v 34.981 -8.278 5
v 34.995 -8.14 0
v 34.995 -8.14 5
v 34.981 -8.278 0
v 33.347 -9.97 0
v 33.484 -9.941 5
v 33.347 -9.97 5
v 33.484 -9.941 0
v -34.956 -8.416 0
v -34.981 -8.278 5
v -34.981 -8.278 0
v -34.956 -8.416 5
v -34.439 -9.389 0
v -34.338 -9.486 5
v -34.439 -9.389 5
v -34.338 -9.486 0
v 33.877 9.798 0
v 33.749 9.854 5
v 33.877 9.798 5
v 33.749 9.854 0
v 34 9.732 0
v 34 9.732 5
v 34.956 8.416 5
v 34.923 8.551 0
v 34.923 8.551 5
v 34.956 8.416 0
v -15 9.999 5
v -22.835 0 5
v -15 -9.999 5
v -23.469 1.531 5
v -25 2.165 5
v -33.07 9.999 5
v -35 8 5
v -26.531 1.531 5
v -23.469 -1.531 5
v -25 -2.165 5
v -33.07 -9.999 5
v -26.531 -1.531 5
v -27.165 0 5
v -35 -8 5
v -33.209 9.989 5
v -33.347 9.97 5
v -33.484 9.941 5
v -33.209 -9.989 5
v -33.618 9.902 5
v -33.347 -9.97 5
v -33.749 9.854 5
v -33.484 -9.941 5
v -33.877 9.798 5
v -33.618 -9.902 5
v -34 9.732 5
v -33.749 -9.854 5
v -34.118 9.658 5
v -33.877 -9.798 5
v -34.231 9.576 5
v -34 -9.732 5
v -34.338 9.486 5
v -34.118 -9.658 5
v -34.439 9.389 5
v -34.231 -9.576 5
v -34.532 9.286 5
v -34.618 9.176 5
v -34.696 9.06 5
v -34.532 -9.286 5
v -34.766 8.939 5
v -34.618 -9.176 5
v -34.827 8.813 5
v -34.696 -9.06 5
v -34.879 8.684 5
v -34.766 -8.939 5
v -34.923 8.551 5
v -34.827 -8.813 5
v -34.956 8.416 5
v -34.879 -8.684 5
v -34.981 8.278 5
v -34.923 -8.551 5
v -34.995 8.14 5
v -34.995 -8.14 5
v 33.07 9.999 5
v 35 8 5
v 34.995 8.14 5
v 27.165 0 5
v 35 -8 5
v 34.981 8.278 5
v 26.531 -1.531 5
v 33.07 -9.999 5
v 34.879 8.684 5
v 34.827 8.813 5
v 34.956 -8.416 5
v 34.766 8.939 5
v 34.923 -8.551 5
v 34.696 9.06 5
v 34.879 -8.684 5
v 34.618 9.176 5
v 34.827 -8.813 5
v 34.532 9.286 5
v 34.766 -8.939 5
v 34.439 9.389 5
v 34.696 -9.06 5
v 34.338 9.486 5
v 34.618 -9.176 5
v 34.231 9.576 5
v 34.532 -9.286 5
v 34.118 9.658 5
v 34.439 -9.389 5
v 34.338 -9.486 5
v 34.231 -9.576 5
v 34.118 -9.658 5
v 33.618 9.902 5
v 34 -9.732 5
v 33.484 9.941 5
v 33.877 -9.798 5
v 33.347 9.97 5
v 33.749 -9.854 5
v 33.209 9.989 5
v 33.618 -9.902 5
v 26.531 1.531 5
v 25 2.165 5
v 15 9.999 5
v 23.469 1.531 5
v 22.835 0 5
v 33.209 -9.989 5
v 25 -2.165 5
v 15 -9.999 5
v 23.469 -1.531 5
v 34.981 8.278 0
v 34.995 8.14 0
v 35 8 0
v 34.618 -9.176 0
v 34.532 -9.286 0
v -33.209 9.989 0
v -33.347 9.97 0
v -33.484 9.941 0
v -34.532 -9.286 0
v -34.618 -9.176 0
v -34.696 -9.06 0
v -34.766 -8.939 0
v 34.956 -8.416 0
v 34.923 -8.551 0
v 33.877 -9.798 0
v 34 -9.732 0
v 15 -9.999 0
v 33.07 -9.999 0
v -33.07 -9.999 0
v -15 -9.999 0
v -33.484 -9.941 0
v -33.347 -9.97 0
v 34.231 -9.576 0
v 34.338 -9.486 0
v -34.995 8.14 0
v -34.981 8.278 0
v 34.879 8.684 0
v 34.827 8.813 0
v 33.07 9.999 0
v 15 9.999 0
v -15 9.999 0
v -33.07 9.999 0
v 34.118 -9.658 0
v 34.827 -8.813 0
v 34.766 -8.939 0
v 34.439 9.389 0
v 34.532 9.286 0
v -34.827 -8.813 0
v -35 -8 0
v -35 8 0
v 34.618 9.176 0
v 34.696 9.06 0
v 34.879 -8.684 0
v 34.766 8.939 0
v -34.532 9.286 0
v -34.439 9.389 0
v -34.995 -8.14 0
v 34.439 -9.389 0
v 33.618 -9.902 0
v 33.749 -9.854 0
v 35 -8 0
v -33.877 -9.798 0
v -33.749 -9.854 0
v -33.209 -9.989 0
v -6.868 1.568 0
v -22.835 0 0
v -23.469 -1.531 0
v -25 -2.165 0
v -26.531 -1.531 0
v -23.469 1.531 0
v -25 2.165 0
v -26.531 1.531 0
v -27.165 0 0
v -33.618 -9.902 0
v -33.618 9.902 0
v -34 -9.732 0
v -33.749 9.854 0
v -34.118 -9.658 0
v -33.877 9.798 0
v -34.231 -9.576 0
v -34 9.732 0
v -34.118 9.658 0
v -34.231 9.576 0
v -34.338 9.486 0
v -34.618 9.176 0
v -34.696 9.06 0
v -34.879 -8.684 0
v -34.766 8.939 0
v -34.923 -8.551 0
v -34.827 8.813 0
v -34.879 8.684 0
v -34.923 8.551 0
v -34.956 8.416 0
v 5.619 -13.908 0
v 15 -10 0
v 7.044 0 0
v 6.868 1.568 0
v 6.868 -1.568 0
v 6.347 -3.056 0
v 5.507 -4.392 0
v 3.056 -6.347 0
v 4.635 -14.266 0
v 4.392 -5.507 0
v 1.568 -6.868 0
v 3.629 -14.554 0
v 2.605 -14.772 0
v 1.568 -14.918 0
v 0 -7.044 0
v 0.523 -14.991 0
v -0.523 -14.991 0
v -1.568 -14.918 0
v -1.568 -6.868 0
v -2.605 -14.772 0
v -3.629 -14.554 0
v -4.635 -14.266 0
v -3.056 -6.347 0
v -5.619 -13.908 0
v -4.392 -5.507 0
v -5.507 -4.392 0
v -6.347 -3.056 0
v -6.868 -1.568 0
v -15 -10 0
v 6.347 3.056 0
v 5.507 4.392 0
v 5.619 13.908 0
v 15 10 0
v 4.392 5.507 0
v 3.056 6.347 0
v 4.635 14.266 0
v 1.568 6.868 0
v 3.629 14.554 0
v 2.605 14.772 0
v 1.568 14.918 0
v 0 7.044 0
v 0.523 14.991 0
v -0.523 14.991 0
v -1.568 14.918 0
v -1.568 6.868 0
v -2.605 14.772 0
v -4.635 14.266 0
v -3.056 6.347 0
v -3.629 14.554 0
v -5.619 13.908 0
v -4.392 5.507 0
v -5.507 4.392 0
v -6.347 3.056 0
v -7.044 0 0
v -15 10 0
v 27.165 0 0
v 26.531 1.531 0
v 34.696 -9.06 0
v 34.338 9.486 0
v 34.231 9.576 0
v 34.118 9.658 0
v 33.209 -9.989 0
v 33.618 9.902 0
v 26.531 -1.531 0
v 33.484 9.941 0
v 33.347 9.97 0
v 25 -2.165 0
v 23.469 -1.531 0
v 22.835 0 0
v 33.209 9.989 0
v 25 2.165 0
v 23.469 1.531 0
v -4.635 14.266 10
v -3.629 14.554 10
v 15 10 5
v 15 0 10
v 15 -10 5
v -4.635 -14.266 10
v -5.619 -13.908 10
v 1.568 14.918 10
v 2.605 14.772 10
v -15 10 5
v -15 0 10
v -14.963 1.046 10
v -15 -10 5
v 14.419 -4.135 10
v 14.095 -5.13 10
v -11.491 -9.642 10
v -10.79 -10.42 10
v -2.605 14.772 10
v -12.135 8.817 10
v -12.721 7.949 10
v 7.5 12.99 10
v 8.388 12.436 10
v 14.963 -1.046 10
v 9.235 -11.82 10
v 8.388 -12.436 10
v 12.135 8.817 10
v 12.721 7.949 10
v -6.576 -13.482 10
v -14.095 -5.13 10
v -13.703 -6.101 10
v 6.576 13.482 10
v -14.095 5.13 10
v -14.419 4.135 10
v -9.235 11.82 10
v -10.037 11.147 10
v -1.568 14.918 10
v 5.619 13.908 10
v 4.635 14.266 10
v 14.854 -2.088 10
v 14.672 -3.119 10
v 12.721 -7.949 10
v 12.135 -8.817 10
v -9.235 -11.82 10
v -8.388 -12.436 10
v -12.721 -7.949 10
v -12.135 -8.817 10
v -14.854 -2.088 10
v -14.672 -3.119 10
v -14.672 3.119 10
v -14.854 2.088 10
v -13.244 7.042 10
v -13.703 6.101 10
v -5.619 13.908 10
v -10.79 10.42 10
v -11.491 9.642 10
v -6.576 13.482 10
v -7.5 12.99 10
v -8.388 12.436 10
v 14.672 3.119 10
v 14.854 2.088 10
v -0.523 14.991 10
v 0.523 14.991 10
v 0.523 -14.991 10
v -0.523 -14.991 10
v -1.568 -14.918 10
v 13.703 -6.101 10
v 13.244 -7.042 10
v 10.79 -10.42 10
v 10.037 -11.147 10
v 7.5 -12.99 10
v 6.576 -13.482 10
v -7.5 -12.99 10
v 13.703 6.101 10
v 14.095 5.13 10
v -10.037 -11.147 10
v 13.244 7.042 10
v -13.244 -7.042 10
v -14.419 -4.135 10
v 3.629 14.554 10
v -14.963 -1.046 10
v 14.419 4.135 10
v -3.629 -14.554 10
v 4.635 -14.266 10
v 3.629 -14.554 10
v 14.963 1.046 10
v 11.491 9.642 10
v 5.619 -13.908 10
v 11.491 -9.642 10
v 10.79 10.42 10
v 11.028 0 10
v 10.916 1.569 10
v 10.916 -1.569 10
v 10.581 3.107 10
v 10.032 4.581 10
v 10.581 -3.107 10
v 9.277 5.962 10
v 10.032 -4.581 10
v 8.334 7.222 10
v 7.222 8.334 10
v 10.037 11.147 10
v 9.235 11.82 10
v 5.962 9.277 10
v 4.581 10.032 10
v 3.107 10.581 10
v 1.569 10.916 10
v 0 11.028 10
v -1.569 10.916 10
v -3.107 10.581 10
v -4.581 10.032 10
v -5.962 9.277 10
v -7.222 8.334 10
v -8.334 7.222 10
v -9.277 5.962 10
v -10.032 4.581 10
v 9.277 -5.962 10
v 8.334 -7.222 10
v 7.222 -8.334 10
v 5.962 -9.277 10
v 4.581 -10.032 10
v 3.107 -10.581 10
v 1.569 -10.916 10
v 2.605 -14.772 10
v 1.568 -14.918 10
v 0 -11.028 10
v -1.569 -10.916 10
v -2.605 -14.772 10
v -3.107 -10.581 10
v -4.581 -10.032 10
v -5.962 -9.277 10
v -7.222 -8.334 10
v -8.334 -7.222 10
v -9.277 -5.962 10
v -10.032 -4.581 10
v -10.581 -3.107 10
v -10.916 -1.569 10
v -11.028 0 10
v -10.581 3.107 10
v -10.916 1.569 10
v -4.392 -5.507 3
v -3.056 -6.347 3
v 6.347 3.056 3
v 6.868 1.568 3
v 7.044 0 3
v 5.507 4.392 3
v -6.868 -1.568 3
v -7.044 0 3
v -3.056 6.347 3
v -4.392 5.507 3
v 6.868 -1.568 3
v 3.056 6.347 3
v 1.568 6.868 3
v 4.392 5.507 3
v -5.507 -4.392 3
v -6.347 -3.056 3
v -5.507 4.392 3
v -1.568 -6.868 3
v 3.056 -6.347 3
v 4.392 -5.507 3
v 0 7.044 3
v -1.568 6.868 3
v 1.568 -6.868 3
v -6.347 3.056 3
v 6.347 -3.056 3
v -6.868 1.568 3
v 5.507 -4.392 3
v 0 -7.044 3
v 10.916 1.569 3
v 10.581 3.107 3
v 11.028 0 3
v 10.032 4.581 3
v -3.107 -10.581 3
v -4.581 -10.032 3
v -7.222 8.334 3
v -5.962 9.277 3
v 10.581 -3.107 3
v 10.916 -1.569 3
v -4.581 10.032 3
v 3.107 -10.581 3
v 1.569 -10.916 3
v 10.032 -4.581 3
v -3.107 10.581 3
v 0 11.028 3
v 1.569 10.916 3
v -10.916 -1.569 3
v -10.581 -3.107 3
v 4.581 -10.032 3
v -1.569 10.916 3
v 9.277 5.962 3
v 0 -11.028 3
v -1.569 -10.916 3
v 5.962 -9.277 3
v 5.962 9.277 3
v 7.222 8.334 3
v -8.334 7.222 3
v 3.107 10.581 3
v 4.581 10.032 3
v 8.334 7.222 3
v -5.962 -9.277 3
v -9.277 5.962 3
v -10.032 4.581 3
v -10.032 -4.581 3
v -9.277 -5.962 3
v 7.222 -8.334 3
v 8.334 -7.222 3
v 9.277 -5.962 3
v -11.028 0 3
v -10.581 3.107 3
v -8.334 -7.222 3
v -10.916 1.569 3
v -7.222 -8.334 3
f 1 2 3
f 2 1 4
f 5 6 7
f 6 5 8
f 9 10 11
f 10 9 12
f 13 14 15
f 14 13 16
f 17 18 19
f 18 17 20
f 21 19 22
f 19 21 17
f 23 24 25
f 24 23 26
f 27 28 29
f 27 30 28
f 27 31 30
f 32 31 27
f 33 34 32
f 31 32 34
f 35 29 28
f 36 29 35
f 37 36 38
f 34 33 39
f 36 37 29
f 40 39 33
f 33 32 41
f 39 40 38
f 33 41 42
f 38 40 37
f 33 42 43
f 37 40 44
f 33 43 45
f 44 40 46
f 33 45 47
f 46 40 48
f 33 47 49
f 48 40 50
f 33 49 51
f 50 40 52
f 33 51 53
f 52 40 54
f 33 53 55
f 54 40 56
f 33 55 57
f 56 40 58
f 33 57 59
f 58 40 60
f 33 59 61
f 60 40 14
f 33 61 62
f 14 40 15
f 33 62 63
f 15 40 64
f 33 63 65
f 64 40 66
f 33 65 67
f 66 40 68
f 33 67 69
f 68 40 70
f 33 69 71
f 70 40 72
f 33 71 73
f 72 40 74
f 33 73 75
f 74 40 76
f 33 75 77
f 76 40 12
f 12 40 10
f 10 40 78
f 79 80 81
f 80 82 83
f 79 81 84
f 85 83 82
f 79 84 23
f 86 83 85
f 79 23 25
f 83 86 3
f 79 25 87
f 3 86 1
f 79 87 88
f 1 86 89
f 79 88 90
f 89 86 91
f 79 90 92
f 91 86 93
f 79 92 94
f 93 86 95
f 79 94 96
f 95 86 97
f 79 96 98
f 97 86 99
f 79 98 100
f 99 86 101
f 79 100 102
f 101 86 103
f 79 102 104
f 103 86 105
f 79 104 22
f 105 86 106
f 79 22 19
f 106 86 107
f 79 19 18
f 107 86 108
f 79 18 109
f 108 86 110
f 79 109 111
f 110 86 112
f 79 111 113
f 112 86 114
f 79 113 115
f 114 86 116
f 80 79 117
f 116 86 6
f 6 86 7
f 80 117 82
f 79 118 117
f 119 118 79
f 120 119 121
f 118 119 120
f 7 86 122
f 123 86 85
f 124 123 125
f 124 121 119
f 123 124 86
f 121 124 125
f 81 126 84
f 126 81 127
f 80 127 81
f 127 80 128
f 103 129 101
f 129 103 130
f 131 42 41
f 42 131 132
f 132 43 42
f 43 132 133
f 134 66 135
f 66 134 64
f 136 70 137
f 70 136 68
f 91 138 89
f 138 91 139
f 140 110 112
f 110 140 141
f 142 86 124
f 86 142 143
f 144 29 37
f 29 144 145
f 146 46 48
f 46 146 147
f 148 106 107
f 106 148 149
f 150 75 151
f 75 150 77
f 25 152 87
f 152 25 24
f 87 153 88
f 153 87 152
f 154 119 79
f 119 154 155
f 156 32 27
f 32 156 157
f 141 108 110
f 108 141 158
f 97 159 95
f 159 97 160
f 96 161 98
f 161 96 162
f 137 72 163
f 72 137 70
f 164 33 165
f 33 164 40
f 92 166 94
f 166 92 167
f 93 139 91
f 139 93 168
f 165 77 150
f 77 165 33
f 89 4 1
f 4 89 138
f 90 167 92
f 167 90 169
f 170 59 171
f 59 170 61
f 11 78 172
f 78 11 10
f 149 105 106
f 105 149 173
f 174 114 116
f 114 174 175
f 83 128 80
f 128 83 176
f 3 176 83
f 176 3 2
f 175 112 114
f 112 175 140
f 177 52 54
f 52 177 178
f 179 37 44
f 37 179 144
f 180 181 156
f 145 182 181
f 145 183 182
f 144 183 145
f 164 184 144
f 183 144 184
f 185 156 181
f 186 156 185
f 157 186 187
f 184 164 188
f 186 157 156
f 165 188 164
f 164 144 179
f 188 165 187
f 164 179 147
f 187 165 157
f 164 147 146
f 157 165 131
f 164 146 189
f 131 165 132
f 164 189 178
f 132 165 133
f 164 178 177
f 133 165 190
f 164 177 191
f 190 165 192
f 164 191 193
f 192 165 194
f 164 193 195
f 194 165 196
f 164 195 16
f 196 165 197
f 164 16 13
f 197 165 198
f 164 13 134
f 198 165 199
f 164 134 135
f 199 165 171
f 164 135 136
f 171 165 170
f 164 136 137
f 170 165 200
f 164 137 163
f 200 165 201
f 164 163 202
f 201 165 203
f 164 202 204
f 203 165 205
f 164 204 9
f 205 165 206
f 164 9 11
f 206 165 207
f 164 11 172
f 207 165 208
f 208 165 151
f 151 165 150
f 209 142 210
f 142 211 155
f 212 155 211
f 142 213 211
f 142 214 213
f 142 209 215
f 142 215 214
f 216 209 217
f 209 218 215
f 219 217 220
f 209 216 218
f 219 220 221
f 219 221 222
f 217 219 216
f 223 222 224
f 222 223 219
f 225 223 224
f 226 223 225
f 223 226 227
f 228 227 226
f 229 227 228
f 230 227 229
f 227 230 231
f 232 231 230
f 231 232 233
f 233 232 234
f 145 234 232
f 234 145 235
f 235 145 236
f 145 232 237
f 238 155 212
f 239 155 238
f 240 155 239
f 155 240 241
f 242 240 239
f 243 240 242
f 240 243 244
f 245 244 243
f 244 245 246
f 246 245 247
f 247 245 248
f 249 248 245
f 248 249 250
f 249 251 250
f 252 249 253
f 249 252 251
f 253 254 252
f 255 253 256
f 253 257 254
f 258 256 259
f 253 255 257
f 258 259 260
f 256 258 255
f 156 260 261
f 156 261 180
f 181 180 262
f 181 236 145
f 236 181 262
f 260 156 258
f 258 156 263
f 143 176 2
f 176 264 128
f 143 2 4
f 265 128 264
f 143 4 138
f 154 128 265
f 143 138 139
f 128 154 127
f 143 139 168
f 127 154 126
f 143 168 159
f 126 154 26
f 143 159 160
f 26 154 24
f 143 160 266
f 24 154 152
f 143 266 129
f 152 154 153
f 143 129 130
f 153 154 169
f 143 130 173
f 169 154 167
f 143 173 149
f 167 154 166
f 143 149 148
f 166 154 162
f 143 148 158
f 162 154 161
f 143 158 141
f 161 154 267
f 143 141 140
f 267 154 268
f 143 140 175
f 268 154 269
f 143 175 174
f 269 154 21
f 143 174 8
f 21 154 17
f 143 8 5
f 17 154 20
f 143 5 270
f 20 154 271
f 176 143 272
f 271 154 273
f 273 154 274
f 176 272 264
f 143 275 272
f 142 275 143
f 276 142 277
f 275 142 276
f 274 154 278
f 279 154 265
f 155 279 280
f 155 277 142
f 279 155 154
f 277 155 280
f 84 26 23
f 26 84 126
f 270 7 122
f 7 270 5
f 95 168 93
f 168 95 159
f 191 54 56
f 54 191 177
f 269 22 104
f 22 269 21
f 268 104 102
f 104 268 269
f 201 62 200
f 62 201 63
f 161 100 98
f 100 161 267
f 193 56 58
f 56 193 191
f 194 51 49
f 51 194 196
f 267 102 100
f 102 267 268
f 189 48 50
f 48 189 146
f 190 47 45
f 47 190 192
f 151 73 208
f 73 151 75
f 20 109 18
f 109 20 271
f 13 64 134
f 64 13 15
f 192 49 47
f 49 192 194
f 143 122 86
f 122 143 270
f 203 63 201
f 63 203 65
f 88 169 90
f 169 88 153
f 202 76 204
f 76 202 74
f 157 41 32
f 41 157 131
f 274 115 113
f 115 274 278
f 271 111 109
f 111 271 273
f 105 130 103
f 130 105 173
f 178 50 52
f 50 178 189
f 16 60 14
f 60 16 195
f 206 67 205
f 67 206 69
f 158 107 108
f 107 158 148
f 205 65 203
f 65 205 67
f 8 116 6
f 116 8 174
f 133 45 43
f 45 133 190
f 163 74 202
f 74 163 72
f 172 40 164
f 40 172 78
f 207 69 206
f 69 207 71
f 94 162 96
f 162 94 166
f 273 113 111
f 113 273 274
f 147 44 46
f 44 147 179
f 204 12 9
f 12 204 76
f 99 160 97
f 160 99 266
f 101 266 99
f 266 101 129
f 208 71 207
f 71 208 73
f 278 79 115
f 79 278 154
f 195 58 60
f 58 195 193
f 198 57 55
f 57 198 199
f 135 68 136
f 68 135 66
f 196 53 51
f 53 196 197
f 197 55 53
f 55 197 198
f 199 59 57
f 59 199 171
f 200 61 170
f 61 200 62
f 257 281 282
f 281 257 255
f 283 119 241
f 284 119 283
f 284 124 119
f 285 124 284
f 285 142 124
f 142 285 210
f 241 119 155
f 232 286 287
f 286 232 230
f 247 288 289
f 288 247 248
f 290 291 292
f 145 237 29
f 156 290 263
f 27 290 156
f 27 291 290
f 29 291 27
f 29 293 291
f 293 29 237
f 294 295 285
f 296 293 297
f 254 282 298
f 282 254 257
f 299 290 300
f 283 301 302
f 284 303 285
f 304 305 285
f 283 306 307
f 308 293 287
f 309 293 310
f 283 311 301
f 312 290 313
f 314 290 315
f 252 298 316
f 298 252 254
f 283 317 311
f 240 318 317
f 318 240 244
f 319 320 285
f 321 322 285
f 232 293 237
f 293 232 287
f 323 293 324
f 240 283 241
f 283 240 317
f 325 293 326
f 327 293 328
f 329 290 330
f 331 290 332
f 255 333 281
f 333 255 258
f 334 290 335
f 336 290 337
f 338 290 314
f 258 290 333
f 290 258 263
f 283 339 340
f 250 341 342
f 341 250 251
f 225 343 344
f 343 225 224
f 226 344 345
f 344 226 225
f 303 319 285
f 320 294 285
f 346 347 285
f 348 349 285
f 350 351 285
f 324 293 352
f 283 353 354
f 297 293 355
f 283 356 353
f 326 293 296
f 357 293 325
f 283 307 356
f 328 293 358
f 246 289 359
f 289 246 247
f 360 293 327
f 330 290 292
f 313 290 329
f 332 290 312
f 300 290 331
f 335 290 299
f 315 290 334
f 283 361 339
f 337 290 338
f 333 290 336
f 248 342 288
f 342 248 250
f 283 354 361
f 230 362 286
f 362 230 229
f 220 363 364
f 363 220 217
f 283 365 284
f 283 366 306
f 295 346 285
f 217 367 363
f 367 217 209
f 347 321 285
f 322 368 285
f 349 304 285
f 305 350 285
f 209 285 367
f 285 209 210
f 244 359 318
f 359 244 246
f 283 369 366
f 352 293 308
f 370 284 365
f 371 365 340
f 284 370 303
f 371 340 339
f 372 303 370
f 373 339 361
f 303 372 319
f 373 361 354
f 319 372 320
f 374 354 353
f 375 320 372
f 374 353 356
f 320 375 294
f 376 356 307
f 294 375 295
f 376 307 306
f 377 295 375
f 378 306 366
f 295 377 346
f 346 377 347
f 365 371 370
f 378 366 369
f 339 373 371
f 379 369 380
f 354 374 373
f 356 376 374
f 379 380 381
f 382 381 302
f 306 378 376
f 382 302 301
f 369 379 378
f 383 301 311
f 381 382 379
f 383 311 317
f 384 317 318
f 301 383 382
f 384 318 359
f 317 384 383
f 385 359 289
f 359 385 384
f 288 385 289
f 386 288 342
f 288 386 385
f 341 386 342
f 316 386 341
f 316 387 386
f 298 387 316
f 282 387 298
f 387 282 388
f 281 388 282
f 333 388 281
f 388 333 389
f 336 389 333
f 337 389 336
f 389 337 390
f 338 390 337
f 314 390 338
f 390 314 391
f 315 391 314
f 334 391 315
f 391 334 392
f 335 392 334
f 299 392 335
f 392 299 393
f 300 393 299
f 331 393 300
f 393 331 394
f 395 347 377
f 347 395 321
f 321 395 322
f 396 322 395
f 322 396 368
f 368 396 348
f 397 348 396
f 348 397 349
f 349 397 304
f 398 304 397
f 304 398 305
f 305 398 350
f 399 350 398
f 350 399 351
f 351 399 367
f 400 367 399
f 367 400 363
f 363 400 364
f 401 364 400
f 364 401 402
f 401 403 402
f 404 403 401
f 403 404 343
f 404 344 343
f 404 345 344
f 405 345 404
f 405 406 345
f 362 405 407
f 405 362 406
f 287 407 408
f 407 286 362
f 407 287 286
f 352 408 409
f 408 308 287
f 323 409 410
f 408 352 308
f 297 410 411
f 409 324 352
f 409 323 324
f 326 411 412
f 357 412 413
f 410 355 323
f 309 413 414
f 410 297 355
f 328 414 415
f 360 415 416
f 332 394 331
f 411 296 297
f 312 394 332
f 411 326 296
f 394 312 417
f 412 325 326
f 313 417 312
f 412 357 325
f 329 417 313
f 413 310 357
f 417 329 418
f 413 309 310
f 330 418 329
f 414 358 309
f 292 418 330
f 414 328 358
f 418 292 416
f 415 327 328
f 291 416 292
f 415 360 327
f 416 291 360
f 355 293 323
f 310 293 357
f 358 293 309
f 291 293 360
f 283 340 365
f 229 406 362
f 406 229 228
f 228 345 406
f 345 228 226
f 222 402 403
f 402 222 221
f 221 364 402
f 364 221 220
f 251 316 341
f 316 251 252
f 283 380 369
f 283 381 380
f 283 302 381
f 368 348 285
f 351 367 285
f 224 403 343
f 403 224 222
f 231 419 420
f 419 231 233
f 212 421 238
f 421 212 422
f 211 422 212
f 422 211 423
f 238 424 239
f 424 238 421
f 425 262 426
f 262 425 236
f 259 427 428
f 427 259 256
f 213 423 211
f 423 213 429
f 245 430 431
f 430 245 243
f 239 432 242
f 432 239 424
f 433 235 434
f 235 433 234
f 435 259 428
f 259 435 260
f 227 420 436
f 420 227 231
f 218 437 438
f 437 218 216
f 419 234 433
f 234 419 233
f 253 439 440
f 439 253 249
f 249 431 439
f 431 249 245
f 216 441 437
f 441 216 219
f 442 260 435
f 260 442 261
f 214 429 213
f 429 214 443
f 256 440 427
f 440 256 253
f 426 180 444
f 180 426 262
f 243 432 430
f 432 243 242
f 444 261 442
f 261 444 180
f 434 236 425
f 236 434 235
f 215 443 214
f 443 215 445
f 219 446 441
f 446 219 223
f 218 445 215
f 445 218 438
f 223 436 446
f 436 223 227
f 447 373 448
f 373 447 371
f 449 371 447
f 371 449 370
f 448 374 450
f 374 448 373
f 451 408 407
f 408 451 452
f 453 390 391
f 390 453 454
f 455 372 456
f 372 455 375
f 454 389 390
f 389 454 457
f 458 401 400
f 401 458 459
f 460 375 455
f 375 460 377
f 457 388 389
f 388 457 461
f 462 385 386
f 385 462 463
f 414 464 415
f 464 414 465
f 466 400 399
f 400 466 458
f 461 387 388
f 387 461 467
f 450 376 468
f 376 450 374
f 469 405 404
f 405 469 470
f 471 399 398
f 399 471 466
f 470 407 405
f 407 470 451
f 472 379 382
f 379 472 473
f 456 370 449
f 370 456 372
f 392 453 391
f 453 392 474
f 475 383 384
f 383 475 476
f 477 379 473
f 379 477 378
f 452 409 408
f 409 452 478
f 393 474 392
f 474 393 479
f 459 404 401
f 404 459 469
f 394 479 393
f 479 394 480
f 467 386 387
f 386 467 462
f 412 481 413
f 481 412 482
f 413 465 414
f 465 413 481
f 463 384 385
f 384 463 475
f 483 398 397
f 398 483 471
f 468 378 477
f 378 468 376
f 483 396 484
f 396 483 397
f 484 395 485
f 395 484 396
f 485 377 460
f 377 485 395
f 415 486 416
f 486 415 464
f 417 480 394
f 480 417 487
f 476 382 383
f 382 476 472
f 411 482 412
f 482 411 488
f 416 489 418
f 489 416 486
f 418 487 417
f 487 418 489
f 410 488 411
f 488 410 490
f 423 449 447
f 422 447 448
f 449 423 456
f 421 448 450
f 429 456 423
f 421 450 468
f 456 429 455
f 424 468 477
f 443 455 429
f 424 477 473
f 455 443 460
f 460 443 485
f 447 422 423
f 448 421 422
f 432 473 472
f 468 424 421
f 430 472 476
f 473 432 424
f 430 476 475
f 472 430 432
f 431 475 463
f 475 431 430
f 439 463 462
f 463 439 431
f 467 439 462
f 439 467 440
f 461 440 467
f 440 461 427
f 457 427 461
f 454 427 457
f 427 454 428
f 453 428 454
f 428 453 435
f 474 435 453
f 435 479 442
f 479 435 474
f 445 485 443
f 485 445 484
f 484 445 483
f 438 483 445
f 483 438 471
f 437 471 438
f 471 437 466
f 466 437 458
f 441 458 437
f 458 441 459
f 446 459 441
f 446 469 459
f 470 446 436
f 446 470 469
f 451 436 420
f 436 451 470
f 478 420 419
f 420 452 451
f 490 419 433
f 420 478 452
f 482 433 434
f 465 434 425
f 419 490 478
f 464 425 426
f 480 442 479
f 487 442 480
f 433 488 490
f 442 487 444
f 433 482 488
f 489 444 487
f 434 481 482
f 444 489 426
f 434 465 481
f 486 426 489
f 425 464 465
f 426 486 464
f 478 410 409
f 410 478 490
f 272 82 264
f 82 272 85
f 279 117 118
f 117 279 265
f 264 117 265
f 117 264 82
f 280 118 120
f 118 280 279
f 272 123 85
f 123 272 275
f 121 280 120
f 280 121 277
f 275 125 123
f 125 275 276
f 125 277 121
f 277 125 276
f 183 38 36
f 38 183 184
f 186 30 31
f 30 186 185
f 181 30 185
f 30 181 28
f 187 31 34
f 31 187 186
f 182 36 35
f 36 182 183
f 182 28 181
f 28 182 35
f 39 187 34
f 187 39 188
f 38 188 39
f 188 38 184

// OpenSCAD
// file: polyhole.scad
// The Cylinder is dead! Long live the Cylinder!
// A module for a polyhole by radius, based on Nophead's work.

module polyhole(h, r, cent = false)
{
    n = max(round(4 * r), 3);
    cylinder(h = h, r = r / cos(180 / n), $fn = n, center = cent);
}
// main file
// Mount for the bottom lead screw bearing

use<polyhole.scad>

LeadBearing();

module LeadBearing()
{
    difference()
    {
        union()
        {
            hull()
            {
                translate([11+4+20-2, 10-2, 0])
                    cylinder(h = 5, r = 2, $fn = 90);
                translate([11+4+20-2, -10+2, 0])
                    cylinder(h = 5, r = 2, $fn = 90);
                translate([-11-4-20+2, 10-2, 0])
                    cylinder(h = 5, r = 2, $fn = 90);
                translate([-11-4-20+2, -10+2, 0])
                    cylinder(h = 5, r = 2, $fn = 90);
            }
            hull()
            {
                cylinder(h = 7+3, r = 11+4, $fn = 90);
                translate([0, 0, 5/2])
                    cube([(11+4)*2, 20, 5], center = true);
            }
        }
        polyhole(10, 7);
        translate([0, 0, 3])
            polyhole(7, 11);
        translate([11+4+10, 0, 0])
            polyhole(5, 2);
        translate([-11-4-10, 0, 0])
            polyhole(5, 2);
    }
}
